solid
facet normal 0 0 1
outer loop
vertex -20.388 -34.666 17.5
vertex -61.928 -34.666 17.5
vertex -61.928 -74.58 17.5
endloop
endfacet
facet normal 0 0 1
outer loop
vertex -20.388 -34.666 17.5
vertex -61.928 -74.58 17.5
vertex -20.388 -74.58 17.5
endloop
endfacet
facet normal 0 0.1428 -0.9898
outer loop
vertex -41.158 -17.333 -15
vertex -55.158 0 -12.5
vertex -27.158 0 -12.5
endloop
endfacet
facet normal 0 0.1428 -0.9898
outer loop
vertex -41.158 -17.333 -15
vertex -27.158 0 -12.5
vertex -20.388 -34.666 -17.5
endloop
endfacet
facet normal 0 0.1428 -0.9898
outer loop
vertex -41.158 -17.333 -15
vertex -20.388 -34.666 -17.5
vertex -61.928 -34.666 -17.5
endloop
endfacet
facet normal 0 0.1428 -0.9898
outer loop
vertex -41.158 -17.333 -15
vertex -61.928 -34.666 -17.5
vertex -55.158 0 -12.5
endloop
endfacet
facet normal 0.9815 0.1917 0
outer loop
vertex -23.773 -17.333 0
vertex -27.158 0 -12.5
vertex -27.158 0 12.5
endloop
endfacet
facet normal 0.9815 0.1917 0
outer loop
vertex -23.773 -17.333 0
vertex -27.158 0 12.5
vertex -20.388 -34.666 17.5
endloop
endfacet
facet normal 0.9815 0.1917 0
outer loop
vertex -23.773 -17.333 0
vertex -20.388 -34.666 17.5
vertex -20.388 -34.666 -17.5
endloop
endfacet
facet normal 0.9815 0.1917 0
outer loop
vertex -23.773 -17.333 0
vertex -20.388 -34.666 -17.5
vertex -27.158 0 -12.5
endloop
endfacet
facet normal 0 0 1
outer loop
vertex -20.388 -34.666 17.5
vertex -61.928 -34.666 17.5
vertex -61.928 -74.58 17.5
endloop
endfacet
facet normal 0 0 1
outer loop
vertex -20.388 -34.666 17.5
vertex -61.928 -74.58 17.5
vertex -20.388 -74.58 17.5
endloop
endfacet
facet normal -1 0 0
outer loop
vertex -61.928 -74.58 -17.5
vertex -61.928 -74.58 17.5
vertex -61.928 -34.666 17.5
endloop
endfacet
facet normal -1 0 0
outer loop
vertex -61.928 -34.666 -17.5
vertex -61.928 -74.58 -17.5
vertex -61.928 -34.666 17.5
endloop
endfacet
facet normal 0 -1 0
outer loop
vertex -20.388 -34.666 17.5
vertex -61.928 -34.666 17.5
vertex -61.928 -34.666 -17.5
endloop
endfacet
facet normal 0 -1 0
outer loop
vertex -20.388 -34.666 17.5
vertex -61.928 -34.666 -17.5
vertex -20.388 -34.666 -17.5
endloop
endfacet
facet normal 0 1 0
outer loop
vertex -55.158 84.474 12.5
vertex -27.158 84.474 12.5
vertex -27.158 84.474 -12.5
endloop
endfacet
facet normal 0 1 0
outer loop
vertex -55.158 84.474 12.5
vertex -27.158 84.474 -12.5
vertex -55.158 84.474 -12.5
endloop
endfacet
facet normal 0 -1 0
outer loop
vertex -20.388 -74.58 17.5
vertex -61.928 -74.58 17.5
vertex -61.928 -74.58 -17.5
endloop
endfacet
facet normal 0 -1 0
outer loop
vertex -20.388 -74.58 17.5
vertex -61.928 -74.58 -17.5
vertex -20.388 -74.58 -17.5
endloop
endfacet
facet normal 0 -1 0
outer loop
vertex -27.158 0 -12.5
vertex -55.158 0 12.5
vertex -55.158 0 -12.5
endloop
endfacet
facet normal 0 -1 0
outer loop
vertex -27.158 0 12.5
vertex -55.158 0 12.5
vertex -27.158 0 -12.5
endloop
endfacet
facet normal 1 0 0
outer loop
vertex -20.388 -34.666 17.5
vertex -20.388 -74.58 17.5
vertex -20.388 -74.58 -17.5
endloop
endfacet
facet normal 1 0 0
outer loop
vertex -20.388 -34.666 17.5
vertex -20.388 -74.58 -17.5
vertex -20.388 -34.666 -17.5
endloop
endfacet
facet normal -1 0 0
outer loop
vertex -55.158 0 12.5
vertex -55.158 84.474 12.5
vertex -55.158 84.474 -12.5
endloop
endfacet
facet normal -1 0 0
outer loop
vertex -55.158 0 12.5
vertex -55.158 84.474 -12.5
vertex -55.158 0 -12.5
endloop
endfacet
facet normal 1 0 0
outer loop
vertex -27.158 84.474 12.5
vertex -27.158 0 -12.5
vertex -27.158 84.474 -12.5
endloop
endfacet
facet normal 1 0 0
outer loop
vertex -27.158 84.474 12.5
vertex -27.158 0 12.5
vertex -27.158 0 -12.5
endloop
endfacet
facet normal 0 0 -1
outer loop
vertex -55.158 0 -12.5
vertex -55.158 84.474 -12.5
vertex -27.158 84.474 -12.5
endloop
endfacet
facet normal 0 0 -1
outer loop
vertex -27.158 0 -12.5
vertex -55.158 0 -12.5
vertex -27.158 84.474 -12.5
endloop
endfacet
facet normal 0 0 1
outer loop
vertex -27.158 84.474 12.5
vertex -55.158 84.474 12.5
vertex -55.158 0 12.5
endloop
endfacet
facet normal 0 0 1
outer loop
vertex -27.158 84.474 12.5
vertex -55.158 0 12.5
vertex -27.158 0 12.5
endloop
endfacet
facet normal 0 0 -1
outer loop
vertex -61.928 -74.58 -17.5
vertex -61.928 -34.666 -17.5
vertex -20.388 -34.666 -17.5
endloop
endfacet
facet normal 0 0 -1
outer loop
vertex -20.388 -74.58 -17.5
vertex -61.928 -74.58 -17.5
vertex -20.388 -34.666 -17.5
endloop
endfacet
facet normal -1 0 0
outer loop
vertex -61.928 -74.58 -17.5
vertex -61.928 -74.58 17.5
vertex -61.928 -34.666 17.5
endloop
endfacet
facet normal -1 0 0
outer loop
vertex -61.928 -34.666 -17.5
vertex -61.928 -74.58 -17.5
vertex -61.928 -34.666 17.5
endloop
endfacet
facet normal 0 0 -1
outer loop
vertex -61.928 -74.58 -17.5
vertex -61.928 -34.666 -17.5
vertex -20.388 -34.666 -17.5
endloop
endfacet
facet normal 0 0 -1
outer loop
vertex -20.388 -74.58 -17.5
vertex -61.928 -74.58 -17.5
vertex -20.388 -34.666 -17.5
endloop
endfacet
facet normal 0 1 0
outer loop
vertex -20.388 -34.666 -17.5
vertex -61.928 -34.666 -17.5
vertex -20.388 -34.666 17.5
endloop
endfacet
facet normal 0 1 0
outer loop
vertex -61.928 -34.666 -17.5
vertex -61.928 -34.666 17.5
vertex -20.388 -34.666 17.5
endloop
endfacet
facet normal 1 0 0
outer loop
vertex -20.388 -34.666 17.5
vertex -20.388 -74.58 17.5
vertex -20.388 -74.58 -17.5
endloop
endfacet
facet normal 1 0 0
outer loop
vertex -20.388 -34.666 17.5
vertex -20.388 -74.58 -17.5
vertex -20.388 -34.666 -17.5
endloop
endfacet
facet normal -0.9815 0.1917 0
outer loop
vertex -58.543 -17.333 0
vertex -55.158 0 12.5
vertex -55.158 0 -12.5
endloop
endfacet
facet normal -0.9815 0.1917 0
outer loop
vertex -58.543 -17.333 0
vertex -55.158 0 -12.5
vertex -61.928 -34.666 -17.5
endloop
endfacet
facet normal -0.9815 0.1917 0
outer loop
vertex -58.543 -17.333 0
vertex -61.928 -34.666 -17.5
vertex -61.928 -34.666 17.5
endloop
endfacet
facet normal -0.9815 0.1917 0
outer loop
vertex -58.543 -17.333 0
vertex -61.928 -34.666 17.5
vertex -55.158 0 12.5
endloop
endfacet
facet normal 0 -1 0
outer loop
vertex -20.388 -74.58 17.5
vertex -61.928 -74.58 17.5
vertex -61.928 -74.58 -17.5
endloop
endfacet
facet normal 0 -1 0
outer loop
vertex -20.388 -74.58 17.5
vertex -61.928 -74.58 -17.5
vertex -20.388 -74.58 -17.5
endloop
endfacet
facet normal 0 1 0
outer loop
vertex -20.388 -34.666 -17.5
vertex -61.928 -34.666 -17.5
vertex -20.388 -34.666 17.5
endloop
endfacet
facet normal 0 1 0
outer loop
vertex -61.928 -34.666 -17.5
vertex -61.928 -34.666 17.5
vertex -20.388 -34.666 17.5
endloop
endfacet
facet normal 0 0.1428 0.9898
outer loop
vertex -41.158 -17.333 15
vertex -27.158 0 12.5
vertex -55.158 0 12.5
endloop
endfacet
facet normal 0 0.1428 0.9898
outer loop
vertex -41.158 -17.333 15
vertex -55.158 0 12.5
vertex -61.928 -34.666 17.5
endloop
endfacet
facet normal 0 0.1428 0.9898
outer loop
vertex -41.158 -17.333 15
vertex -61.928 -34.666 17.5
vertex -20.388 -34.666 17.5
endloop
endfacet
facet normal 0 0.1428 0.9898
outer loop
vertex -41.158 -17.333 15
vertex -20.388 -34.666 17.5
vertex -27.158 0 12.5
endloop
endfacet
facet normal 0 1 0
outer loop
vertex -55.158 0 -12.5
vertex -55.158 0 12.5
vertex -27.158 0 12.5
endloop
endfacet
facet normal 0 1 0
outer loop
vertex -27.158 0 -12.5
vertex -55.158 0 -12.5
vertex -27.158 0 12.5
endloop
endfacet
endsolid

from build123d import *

# Parameters (mm, degrees)
F1_DEPTH  = 12.5
F0_W      = 41.539789
F0_H      = 39.913434
F2_DEPTH  = 17.5
F3_DEPTH  = 17.5
F1_FACE_W = 28
F1_FACE_H = 25
F3_FACE_W = 41.53979
F3_FACE_H = 35


with BuildPart() as f1:
    # F0 (on Top) → F1 (new body, symmetric)
    with BuildSketch(Plane.XY):
        Polygon((-27.157828, 0), (-27.157828, 84.474362), (-55.157828, 84.474362), (-55.157828, 0), (-41.157828, 0), align=None)
    extrude(amount=F1_DEPTH, both=True)


with BuildPart() as f2:
    # F0 (on Top) → F2 (new body, symmetric)
    with BuildSketch(Plane.XY):
        with Locations((-41.157829, -54.623103)):
            Rectangle(F0_W, F0_H)
    extrude(amount=F2_DEPTH, both=True)


with BuildPart() as f3:
    # F0 (on Top) → F3 (new body, symmetric)
    with BuildSketch(Plane.XY):
        with Locations((-41.157829, -54.623103)):
            Rectangle(F0_W, F0_H)
    extrude(amount=F3_DEPTH, both=True)


with BuildPart() as f4:
    # F1_face (on face) → F4 section 0
    with BuildSketch(Plane(origin=(-41.157828, 0, 0), x_dir=(1, 0, 0), z_dir=(0, -1, 0))):
        Rectangle(F1_FACE_W, F1_FACE_H)
    # F3_face (on face) → F4 section 1
    with BuildSketch(Plane(origin=(-41.157828, -34.666386, 0), x_dir=(-1, 0, 0), z_dir=(0, 1, 0))):
        Rectangle(F3_FACE_W, F3_FACE_H)
    loft()


solid = Compound([f1.part, f2.part, f3.part, f4.part])
